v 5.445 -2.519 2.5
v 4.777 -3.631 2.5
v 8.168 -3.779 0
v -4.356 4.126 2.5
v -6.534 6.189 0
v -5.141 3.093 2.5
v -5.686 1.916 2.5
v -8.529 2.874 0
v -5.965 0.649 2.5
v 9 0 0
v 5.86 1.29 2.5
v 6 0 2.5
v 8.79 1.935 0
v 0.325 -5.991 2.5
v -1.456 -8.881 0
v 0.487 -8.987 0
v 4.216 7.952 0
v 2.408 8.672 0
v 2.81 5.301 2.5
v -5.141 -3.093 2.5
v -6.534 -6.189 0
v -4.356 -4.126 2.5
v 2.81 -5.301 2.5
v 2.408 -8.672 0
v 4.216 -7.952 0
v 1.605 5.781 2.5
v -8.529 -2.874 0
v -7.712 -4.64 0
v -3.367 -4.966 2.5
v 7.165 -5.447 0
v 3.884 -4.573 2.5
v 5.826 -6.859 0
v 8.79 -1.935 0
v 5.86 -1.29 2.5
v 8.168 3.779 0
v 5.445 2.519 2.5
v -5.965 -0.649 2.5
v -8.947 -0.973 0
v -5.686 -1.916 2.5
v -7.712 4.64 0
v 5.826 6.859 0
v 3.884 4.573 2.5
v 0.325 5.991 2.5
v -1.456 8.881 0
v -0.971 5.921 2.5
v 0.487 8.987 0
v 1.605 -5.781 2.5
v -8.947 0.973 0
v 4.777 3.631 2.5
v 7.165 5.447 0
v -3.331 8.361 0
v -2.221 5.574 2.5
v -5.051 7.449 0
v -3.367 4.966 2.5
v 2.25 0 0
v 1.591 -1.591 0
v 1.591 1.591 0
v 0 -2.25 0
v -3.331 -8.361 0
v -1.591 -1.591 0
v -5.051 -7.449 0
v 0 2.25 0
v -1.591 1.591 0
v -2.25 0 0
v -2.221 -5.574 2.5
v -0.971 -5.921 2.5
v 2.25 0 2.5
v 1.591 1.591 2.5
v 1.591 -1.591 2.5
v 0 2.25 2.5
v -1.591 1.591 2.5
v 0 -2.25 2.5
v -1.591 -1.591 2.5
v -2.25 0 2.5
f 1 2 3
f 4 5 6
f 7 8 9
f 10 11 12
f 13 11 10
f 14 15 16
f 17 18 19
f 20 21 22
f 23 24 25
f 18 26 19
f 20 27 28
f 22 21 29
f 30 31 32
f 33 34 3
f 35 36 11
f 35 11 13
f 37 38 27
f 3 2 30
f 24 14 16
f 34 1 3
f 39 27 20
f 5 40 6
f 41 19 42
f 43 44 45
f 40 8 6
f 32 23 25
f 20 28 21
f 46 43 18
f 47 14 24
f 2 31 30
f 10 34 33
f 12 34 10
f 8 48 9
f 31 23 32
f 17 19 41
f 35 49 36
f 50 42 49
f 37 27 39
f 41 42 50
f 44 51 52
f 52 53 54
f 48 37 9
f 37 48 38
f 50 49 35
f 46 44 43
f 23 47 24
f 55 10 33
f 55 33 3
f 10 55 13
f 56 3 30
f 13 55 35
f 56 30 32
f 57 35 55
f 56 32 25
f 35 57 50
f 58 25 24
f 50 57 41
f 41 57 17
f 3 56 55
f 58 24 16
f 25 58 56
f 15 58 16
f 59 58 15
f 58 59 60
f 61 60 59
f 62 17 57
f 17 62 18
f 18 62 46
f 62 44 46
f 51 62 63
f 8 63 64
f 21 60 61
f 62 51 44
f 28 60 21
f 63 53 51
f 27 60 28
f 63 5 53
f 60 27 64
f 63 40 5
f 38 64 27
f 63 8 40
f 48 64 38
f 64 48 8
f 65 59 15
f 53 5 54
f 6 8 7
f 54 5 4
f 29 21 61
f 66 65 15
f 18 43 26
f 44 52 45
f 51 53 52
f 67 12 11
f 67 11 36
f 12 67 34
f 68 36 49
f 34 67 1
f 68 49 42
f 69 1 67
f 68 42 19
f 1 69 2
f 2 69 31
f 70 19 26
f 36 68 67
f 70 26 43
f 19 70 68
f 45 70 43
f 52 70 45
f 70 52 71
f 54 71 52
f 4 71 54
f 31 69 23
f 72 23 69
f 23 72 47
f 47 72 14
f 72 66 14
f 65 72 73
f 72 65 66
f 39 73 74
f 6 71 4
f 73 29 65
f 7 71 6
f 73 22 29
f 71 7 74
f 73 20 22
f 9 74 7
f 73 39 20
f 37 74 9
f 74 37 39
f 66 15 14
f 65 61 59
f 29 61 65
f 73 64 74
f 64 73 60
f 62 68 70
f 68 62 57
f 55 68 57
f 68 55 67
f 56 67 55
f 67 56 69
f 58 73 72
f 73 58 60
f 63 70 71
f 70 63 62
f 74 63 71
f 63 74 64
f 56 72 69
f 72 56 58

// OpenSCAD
/*
 * file: prusa-i3-belt-shim.scad
 * author: gregor binder <gregor_reprap@catrix.at>
 * date: 10.11.2013
 * last change: 10.11.2013
 * license: CC BY-NC-SA 3.0
 */

innerdiameter=12;
outerdiameter=18;
thickness=2.5;
holediameter=4.5;

difference() {
	cylinder(h=thickness,r1=outerdiameter/2,r2=innerdiameter/2);
	translate([0,0,-0.5])
		cylinder(h=thickness+5,r=holediameter/2);
}
